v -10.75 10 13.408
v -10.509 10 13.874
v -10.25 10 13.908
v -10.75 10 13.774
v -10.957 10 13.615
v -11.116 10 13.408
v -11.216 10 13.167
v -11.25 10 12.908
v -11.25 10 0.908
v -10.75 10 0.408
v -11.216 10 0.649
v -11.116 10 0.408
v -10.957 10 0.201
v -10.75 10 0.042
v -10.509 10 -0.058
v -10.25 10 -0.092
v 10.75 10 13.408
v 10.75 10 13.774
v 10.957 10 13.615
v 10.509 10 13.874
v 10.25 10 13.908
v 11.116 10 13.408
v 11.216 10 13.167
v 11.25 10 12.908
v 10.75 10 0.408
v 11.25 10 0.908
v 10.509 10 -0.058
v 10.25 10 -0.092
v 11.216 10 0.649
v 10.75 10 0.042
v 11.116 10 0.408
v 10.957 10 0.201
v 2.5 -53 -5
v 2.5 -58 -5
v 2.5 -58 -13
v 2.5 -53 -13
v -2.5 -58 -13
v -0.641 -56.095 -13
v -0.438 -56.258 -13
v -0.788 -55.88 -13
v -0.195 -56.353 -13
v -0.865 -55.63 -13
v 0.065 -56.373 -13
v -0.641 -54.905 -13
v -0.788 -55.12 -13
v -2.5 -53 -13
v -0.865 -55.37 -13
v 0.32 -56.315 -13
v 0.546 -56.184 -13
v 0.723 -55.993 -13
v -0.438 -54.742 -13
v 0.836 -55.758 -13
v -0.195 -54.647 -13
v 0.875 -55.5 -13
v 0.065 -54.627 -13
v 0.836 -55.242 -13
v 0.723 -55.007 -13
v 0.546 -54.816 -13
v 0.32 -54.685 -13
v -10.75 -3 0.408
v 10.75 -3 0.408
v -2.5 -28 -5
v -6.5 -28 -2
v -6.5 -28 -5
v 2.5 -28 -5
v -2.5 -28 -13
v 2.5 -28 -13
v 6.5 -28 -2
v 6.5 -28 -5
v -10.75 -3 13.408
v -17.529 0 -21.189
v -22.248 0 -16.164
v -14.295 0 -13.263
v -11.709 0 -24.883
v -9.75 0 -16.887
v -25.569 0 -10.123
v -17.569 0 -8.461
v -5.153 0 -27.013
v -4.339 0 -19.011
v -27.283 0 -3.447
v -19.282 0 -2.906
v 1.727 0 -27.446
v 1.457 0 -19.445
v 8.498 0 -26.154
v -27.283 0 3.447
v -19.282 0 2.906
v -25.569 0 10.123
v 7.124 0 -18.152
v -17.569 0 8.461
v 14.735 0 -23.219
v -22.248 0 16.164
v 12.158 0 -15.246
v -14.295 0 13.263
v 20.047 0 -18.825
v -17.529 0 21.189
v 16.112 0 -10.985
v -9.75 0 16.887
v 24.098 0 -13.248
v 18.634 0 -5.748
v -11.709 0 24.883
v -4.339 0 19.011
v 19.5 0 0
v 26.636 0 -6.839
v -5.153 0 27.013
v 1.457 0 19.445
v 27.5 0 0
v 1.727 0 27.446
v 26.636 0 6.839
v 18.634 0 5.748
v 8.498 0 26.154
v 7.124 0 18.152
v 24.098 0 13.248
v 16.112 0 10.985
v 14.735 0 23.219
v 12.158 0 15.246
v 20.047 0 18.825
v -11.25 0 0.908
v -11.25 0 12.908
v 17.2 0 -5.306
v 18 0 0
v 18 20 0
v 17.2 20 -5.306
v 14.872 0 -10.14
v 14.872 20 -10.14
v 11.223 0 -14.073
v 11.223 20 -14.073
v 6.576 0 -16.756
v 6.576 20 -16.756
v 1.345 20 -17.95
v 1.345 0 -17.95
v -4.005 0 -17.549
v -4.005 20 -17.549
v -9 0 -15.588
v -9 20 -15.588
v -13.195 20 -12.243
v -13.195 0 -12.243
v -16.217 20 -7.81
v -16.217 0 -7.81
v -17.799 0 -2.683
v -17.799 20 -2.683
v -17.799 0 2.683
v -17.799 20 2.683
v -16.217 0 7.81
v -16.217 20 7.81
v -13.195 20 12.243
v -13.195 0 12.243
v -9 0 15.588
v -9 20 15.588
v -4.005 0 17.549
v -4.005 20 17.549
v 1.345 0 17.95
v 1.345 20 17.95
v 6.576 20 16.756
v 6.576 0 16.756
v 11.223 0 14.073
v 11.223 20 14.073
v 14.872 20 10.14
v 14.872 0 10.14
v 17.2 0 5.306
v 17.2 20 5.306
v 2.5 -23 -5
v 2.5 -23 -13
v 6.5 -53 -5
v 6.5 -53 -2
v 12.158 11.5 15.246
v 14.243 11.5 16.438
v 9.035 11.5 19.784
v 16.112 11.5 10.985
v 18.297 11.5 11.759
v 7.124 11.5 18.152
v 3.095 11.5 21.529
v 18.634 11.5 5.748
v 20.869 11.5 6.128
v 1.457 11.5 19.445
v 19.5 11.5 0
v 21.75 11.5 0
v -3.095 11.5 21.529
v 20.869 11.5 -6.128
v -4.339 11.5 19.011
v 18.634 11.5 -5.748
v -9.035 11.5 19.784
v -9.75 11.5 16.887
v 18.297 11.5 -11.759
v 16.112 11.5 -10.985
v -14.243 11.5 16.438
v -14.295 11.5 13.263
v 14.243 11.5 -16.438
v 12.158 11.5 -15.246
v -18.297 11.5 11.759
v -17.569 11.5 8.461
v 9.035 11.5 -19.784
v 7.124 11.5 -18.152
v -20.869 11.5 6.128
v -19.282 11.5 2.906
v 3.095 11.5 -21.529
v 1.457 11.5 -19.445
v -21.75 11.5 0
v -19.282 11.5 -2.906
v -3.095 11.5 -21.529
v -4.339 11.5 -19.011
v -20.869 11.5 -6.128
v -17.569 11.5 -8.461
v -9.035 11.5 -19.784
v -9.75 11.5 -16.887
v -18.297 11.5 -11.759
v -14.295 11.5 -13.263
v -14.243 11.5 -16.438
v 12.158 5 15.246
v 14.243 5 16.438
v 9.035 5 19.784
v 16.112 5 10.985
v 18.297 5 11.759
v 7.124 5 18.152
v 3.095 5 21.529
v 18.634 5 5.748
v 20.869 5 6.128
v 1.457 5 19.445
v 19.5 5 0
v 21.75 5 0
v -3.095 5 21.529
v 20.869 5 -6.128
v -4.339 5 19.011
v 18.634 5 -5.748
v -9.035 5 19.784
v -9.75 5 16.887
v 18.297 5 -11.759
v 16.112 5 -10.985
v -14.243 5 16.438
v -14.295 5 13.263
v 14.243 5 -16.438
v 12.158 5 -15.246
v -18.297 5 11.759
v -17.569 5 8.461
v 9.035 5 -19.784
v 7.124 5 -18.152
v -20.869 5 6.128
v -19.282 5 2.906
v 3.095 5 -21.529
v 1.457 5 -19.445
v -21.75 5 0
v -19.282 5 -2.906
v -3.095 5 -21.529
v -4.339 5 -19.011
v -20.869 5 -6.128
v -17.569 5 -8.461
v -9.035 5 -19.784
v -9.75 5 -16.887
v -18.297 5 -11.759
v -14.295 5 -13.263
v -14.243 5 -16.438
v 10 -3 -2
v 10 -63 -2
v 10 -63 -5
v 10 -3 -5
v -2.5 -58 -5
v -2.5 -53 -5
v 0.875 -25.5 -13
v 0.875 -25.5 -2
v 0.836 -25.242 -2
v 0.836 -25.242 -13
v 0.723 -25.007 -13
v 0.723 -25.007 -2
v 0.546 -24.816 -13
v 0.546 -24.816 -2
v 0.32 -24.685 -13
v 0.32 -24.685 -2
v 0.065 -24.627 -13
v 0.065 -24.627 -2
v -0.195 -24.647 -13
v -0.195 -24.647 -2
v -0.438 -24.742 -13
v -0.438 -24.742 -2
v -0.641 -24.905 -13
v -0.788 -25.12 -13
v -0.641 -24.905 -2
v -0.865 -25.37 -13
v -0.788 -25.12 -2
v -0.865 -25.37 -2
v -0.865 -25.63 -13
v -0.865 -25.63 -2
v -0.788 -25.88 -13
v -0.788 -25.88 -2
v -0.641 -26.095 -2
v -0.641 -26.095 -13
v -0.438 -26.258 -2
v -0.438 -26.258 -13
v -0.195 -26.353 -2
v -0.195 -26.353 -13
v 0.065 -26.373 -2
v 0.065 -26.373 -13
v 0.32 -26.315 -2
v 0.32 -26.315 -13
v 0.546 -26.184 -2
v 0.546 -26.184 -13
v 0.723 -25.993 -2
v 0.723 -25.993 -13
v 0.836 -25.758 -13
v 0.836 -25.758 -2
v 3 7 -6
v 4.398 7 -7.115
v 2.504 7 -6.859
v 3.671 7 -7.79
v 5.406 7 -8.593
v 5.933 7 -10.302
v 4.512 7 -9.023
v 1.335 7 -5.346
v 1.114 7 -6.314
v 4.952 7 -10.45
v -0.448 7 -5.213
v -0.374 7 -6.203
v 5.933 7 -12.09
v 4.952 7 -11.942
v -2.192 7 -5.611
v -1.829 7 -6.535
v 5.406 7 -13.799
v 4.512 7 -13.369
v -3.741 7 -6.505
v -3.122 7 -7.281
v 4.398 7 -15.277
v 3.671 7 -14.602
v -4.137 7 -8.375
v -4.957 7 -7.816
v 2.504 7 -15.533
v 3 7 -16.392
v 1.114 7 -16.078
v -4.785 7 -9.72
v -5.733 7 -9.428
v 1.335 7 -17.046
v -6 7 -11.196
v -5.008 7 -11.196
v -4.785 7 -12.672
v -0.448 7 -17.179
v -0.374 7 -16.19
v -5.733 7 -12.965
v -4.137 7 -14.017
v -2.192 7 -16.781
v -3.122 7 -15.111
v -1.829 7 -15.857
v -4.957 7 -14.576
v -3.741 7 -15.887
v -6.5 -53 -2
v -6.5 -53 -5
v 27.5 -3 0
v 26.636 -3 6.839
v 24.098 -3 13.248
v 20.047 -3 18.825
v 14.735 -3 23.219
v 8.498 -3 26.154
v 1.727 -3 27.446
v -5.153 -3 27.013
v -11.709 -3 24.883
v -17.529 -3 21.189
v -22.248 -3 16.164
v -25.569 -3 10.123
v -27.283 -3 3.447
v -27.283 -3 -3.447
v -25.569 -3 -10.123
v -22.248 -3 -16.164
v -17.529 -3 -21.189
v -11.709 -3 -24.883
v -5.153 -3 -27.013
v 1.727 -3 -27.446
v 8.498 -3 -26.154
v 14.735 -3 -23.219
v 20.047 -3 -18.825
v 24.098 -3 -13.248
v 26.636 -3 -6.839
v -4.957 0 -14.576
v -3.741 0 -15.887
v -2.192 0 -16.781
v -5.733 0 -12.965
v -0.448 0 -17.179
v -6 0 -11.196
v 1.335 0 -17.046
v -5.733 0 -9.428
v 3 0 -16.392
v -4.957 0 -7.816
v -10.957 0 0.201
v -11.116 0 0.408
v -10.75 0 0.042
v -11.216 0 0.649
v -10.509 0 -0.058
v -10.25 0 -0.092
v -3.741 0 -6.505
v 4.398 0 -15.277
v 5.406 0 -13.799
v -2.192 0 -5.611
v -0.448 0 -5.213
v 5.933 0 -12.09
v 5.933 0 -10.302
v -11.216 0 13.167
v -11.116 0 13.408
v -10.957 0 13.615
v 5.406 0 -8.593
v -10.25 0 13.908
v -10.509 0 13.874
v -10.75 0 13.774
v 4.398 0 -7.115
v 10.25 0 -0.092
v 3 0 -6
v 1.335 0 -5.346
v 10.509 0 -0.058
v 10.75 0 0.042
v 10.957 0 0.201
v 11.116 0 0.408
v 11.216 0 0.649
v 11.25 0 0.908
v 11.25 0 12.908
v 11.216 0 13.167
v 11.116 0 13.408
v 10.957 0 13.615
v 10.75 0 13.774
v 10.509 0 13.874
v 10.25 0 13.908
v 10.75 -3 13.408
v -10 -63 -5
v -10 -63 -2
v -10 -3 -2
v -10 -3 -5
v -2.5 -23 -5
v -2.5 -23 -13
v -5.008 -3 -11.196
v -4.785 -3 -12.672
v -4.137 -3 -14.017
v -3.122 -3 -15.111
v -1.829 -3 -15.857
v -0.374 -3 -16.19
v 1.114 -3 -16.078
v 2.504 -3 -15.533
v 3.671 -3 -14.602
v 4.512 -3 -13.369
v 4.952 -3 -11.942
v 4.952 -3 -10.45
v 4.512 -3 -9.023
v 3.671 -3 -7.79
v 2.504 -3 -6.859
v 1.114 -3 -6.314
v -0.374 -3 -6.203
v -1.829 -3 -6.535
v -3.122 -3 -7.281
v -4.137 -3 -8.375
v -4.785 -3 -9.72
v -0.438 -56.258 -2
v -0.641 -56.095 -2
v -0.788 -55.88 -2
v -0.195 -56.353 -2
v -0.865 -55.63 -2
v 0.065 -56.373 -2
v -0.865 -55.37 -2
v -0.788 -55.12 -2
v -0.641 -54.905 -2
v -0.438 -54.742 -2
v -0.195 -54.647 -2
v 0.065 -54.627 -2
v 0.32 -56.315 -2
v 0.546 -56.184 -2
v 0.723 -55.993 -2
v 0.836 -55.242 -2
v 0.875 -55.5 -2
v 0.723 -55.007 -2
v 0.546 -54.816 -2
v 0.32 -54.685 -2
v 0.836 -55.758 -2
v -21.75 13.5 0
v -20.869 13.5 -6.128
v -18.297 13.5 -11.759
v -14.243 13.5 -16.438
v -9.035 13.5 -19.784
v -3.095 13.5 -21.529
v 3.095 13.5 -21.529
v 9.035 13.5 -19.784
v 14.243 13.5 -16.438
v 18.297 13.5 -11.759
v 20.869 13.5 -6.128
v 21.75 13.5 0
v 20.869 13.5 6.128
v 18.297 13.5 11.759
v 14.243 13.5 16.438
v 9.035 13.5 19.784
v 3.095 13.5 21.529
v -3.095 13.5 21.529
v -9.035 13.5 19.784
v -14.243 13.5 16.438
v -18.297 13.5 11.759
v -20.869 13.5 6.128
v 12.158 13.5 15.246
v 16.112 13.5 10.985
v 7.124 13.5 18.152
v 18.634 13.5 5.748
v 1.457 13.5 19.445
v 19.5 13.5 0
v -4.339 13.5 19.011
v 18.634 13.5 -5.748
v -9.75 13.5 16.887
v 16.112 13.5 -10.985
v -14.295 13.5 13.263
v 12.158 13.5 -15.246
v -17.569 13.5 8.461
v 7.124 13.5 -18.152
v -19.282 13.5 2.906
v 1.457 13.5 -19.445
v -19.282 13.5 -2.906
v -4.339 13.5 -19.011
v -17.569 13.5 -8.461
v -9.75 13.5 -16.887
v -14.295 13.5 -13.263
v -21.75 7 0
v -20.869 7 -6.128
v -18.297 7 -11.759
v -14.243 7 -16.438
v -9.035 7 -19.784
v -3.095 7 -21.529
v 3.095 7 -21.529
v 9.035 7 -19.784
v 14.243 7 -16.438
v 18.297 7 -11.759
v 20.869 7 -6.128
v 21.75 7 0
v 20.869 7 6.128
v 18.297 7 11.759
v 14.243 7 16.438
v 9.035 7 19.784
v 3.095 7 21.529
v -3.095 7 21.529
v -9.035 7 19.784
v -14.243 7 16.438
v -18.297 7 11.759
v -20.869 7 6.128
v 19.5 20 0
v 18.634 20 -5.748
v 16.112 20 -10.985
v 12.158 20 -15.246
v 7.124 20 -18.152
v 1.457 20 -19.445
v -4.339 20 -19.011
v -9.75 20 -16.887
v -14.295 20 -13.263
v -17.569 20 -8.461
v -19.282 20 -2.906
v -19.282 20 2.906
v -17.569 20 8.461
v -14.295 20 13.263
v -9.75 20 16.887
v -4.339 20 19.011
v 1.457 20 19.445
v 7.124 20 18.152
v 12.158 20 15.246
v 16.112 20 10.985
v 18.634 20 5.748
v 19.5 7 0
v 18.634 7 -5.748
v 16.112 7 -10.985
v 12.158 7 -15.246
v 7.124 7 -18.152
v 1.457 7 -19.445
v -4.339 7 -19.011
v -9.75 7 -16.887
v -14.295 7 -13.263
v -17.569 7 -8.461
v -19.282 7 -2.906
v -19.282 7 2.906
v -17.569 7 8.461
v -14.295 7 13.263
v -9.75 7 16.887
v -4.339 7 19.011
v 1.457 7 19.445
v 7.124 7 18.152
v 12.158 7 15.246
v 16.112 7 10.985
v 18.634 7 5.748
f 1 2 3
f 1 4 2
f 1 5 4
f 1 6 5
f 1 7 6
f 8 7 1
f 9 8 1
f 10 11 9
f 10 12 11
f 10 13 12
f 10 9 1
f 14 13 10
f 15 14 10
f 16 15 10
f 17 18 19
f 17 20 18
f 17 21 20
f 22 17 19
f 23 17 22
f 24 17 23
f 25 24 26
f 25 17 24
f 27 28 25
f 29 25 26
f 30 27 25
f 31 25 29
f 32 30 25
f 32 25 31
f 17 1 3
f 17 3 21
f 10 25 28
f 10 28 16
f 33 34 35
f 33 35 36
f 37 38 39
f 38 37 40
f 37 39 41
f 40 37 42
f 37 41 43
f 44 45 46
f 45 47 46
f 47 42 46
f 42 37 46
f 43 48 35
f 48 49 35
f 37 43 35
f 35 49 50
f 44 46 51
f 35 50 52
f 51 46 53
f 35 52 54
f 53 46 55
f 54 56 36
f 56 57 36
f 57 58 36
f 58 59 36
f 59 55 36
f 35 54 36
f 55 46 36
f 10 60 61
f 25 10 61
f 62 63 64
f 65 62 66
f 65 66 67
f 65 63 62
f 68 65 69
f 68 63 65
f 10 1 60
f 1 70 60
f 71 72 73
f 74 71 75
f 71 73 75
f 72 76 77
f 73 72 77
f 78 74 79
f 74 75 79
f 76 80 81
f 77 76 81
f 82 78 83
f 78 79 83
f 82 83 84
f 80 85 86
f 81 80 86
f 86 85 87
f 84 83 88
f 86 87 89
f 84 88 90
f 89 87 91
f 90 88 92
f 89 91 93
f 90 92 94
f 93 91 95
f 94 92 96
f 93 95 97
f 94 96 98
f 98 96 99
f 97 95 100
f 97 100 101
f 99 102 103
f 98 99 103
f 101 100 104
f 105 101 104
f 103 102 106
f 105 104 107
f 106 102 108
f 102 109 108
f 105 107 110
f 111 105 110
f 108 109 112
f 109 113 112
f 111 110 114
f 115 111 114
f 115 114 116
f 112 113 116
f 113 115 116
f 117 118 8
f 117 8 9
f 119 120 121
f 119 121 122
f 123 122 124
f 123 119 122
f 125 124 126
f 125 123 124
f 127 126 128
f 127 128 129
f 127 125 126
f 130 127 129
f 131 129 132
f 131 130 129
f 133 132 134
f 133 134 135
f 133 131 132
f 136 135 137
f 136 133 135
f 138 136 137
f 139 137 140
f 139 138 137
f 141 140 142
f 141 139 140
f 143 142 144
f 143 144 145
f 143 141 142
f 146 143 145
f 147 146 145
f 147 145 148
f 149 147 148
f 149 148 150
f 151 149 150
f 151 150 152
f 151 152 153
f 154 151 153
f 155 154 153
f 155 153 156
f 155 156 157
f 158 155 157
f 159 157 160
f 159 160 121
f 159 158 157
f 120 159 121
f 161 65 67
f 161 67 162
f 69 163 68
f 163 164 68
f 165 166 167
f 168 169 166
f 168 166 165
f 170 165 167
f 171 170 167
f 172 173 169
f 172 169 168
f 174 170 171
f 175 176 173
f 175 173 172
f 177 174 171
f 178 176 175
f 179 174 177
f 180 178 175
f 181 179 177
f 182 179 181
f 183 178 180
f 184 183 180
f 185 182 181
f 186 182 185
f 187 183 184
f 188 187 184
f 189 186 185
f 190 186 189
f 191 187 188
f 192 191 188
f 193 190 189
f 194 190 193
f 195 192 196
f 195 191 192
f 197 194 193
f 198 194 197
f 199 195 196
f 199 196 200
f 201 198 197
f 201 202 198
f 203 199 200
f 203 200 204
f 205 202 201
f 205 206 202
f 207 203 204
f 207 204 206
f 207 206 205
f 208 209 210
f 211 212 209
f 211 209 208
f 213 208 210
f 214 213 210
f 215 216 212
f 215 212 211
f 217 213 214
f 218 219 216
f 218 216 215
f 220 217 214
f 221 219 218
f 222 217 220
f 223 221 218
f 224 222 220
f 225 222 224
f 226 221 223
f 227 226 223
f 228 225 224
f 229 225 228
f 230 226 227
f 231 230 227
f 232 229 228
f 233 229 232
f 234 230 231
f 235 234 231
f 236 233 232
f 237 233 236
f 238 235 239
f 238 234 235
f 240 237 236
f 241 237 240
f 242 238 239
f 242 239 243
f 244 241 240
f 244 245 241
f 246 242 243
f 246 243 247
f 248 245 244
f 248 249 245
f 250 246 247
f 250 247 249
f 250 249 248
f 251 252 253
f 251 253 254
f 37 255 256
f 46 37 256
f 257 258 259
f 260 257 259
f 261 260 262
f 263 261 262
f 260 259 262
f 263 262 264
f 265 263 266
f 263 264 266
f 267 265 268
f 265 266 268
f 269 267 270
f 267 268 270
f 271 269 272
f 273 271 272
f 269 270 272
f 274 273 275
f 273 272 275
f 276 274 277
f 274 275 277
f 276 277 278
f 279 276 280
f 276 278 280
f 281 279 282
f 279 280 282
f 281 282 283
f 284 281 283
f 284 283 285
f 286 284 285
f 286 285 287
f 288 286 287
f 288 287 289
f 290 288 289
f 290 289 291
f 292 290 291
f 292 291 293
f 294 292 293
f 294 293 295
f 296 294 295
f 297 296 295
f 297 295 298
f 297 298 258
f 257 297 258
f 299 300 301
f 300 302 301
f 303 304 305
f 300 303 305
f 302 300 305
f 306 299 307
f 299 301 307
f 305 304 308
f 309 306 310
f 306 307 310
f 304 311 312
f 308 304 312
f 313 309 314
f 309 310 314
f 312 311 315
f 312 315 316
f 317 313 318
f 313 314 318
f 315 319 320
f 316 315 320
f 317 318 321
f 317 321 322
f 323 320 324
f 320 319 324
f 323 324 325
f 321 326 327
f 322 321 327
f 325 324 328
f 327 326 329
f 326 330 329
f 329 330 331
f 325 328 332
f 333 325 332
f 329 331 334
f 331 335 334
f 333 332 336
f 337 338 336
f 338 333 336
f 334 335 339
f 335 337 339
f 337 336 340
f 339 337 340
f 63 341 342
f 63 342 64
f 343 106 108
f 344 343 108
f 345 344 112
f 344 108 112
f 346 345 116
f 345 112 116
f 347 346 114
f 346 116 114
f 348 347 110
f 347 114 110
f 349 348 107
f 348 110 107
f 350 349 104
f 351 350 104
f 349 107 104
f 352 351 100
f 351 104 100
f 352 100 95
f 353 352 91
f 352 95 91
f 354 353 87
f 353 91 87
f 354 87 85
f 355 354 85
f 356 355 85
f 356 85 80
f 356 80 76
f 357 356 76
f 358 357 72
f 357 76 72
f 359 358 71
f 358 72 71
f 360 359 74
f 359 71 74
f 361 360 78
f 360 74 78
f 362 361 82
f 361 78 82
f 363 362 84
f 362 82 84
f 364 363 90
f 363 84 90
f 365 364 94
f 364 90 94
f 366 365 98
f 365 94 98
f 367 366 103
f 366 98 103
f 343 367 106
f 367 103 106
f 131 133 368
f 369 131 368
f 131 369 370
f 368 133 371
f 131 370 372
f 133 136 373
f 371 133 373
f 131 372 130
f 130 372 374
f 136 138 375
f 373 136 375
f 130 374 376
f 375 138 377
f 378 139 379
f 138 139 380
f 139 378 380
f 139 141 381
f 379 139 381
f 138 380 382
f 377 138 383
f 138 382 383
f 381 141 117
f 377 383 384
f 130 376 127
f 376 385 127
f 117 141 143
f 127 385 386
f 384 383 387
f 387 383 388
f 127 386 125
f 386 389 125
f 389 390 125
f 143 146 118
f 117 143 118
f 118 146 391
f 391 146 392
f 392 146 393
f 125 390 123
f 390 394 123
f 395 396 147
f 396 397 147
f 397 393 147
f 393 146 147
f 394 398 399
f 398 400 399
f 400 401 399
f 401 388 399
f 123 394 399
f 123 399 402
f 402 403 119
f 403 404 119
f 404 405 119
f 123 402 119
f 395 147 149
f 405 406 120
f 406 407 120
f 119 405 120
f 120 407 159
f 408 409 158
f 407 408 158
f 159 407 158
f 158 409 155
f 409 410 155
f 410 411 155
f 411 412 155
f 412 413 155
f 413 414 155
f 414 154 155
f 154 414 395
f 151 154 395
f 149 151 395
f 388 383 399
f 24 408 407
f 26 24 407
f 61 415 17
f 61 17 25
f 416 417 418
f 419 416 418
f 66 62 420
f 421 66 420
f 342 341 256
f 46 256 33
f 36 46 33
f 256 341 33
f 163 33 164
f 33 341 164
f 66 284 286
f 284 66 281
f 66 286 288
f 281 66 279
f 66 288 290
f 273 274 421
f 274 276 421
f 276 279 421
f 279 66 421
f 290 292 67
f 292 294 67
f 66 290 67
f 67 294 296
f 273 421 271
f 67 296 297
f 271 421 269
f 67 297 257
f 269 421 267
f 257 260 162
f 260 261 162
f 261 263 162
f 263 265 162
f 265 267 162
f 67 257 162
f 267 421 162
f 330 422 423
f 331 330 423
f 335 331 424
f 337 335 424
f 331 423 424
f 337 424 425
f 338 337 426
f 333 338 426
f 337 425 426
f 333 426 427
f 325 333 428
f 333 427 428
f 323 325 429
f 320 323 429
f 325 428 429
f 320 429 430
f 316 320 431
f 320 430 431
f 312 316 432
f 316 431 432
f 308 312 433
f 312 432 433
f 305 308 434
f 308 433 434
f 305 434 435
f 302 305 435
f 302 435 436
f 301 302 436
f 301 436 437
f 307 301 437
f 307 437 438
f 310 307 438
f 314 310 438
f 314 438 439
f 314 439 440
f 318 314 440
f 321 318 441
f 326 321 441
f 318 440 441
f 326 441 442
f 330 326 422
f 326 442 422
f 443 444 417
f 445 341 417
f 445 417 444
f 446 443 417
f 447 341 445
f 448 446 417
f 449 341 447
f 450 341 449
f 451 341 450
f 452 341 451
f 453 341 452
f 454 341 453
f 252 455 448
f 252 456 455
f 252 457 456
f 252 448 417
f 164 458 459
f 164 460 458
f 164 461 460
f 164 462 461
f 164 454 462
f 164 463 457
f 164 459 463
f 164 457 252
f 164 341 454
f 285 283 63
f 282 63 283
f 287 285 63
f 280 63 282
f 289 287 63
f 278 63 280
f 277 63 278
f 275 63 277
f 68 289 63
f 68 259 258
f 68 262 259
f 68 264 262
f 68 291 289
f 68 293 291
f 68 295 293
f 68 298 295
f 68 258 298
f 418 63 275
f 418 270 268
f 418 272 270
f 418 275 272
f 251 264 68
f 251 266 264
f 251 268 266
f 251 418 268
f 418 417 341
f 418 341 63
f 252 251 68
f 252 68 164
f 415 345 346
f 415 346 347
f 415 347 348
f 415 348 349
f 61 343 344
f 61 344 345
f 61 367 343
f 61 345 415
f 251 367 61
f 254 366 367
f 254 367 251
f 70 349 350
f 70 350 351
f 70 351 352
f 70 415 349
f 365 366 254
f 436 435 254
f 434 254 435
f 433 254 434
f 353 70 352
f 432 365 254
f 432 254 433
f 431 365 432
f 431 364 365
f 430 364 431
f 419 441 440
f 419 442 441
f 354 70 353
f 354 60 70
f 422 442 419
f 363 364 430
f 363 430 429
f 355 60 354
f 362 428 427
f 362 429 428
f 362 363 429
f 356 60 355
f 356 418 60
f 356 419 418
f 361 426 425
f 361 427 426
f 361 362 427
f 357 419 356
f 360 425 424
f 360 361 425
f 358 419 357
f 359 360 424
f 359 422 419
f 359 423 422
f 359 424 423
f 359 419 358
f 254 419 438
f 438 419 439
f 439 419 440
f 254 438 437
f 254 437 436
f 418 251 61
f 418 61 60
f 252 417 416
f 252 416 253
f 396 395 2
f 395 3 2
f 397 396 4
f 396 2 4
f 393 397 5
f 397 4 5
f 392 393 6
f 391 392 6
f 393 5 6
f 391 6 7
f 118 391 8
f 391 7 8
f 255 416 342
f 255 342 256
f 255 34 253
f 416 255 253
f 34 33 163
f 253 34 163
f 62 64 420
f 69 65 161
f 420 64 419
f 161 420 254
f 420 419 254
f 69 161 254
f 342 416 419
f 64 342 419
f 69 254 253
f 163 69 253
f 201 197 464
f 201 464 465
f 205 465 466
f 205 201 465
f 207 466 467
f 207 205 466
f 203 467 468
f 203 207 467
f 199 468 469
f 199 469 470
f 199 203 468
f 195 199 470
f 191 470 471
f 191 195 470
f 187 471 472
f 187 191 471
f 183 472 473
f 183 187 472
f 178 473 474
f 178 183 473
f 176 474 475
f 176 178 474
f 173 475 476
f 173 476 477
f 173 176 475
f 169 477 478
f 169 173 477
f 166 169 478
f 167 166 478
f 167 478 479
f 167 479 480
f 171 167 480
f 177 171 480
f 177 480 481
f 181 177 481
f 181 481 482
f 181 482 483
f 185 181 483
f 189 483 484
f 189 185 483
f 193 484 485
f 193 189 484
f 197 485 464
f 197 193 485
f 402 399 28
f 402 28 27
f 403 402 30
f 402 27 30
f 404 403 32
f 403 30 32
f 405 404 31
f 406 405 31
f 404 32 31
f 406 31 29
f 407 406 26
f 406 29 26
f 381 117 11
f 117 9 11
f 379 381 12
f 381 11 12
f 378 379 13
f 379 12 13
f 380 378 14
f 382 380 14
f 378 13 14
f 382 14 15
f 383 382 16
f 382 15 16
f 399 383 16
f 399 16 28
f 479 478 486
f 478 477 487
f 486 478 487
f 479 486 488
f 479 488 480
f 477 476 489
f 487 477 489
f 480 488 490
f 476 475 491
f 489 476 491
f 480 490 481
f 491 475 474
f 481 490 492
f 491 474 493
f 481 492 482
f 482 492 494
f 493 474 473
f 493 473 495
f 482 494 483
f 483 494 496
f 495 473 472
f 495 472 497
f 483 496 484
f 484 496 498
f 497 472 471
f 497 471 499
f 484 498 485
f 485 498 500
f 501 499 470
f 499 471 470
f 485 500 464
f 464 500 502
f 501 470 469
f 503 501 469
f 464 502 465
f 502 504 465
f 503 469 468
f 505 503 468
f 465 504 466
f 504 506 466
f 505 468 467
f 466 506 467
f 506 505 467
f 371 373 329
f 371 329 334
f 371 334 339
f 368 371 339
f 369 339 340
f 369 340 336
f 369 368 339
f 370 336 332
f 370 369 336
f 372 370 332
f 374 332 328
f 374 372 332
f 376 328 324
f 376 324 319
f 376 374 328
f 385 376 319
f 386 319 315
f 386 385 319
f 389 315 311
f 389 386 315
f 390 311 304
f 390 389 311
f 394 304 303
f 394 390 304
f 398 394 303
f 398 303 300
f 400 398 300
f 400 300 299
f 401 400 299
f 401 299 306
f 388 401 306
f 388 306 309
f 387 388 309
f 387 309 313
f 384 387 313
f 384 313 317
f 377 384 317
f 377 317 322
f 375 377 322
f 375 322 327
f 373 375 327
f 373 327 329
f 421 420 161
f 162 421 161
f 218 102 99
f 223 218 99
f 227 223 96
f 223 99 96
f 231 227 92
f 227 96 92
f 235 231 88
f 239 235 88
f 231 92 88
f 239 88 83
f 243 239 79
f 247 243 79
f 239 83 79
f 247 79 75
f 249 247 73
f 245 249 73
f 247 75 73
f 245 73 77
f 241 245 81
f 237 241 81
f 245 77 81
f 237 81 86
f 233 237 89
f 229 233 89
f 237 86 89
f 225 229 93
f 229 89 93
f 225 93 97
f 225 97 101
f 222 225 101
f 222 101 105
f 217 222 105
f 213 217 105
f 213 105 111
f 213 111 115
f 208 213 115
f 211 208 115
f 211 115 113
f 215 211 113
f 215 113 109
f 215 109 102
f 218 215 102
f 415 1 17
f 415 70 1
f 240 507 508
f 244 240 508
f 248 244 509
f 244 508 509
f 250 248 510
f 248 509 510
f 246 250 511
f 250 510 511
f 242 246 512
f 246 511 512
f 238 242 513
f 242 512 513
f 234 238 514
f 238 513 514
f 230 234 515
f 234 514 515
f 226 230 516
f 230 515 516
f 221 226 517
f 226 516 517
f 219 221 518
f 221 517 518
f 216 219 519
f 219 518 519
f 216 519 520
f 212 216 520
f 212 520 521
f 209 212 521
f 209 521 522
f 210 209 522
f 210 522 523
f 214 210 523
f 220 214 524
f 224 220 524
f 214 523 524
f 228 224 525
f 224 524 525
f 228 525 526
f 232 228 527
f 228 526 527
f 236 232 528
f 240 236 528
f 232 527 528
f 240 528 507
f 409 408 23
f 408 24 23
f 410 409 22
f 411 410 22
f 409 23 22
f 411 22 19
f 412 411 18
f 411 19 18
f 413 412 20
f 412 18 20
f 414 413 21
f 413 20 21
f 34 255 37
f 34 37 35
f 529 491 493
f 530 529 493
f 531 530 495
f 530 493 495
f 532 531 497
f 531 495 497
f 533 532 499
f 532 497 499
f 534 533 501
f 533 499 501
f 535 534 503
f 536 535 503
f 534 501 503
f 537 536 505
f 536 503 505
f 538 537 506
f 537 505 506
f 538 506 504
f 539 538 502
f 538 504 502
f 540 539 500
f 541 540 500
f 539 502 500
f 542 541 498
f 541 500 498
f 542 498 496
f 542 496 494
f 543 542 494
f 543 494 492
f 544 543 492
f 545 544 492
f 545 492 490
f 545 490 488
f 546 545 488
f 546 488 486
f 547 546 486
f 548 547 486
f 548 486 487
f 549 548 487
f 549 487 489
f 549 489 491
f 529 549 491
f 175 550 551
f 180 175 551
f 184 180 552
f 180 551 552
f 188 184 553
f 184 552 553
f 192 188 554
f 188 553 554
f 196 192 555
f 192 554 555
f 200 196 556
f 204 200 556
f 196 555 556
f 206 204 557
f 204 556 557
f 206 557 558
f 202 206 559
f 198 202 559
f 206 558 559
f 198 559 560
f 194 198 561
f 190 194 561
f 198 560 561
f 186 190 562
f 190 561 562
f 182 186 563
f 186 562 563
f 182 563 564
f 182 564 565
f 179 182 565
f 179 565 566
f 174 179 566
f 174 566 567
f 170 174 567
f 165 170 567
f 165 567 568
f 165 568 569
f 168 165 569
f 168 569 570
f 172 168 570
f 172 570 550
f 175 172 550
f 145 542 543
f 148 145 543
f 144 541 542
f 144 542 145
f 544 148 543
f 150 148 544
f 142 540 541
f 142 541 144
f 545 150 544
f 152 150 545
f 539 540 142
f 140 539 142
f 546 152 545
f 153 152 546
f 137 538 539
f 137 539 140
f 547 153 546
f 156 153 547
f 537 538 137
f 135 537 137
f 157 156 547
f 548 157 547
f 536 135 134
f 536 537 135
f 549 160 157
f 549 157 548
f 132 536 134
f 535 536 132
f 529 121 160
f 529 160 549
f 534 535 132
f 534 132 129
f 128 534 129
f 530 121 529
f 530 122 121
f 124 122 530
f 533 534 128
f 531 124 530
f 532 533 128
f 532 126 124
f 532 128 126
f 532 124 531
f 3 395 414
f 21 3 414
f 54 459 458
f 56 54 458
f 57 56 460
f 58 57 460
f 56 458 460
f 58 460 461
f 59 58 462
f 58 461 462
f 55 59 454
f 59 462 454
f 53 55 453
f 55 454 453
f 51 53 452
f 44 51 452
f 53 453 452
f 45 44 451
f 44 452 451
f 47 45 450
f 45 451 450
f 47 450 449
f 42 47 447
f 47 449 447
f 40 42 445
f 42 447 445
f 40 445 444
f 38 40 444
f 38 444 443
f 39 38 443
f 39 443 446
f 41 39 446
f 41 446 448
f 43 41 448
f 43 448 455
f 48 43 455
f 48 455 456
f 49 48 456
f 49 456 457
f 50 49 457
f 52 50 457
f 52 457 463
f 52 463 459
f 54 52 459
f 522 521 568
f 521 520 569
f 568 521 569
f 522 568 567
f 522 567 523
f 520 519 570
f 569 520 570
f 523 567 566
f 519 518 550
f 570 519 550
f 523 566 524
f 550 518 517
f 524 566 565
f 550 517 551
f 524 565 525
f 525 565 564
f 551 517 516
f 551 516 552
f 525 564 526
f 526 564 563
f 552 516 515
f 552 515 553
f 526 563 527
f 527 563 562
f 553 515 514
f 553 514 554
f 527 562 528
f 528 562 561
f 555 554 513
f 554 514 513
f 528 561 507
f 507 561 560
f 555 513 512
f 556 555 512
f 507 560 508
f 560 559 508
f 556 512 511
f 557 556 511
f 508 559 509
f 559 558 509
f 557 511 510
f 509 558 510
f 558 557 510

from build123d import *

# Parameters (mm, degrees)
SKETCH_1_R               = 19.5
SKETCH_1_R_2             = 18
EXTRUDE_1_DEPTH          = 20
SKETCH_3_R               = 27.5
EXTRUDE_2_DEPTH          = 3
SKETCH_10_R              = 6
SKETCH_10_R_2            = 5
EXTRUDE_6_DEPTH          = 10
SKETCH_11_R              = 5.007506695
CUT_EXTRUDE_4_DEPTH      = 19
CUT_EXTRUDE_4_DEPTH_BACK = 10
SKETCH_15_W              = 20
SKETCH_15_H              = 60
SKETCH_15_W_2            = 13
SKETCH_15_H_2            = 25
EXTRUDE_7_DEPTH          = 1
EXTRUDE_7_DEPTH_BACK     = 2
SKETCH_16_W              = 5
SKETCH_16_H              = 5
EXTRUDE_8_DEPTH          = 10
SKETCH_18_R              = 0.875
CUT_EXTRUDE_5_DEPTH      = 10
CUT_EXTRUDE_5_DEPTH_BACK = 39
SKETCH_12_W              = 21.5
SKETCH_12_H              = 13
CUT_EXTRUDE_6_DEPTH      = 21.5
SKETCH_19_W              = 22.5
SKETCH_19_H              = 14
SKETCH_19_W_2            = 21.5
SKETCH_19_H_2            = 13
EXTRUDE_9_DEPTH          = 10
FILLET_2_R               = 1
FILLET_3_R               = 1
FILLET_4_R               = 1
FILLET_5_R               = 1
SKETCH_25_R              = 21.75
SKETCH_25_R_2            = 19.5
EXTRUDE_12_DEPTH         = 2
EXTRUDE_START            = -1
SKETCH_26_R              = 21.75
SKETCH_26_R_2            = 19.5
EXTRUDE_13_DEPTH         = 2


with BuildPart() as part:
    # 草圖1 → 填料-伸長1 (new body)
    with BuildSketch(Plane(origin=(0, 0, 0), x_dir=(1, 0, 0), z_dir=(0, 1, 0))):
        Circle(SKETCH_1_R)
        Circle(SKETCH_1_R_2, mode=Mode.SUBTRACT)
    extrude(amount=EXTRUDE_1_DEPTH)

    # 草圖3 → 填料-伸長2 (add)
    with BuildSketch(Plane.XZ):
        Circle(SKETCH_3_R)
    extrude(amount=EXTRUDE_2_DEPTH)

    # 草圖10 → 填料-伸長6 (add)
    with BuildSketch(Plane(origin=(0, -3, 0), x_dir=(-1, 0, 0), z_dir=(0, -1, 0))):
        with Locations((0, 11.196036894)):
            Circle(SKETCH_10_R)
        with Locations((0, 11.196036894)):
            Circle(SKETCH_10_R_2, mode=Mode.SUBTRACT)
    extrude(amount=-EXTRUDE_6_DEPTH)

    # 草圖11 → 除料-伸長4 (cut, two sides)
    with BuildSketch(Plane(origin=(0, -3, 0), x_dir=(-1, 0, 0), z_dir=(0, -1, 0))) as cut_extrude_4_sk:
        with Locations((0, 11.196036894)):
            Circle(SKETCH_11_R)
    extrude(amount=CUT_EXTRUDE_4_DEPTH, mode=Mode.SUBTRACT)
    extrude(cut_extrude_4_sk.sketch, amount=-CUT_EXTRUDE_4_DEPTH_BACK, mode=Mode.SUBTRACT)

    # 草圖15 → 填料-伸長7 (add, two sides)
    with BuildSketch(Plane.XY.offset(-3)) as extrude_7_sk:
        with Locations((0, -33)):
            Rectangle(SKETCH_15_W, SKETCH_15_H)
        with Locations((0, -40.5)):
            Rectangle(SKETCH_15_W_2, SKETCH_15_H_2, mode=Mode.SUBTRACT)
    extrude(amount=EXTRUDE_7_DEPTH)
    extrude(extrude_7_sk.sketch, amount=-EXTRUDE_7_DEPTH_BACK)

    # 草圖16 → 填料-伸長8 (add)
    with BuildSketch(Plane.XY.offset(-3)):
        with Locations((0, -25.5)):
            Rectangle(SKETCH_16_W, SKETCH_16_H)
        with Locations((0, -55.5)):
            Rectangle(SKETCH_16_W, SKETCH_16_H)
    extrude(amount=-EXTRUDE_8_DEPTH)

    # 草圖18 → 除料-伸長5 (cut, two sides)
    with BuildSketch(Plane.XY) as cut_extrude_5_sk:
        with Locations((0, -55.5)):
            Circle(SKETCH_18_R)
        with Locations((0, -25.5)):
            Circle(SKETCH_18_R)
    extrude(amount=CUT_EXTRUDE_5_DEPTH, mode=Mode.SUBTRACT)
    extrude(cut_extrude_5_sk.sketch, amount=-CUT_EXTRUDE_5_DEPTH_BACK, mode=Mode.SUBTRACT)

    # 草圖12 → 除料-伸長6 (cut)
    with BuildSketch(Plane.XZ.offset(3)):
        with Locations((0, 6.907998134)):
            Rectangle(SKETCH_12_W, SKETCH_12_H)
    extrude(amount=-CUT_EXTRUDE_6_DEPTH, mode=Mode.SUBTRACT)

    # 草圖19 → 填料-伸長9 (add)
    with BuildSketch(Plane(origin=(0, 0, 0), x_dir=(1, 0, 0), z_dir=(0, 1, 0))):
        with Locations((0, -6.907998134)):
            Rectangle(SKETCH_19_W, SKETCH_19_H)
        with Locations((0, -6.907998134)):
            Rectangle(SKETCH_19_W_2, SKETCH_19_H_2, mode=Mode.SUBTRACT)
    extrude(amount=EXTRUDE_9_DEPTH)

    # 圓角2
    fillet_2_edges = [part.edges().sort_by_distance(p)[0] for p in [
        (-11.25, 5, -0.092001866),
    ]]
    fillet(fillet_2_edges, radius=FILLET_2_R)

    # 圓角3
    fillet_3_edges = [part.edges().sort_by_distance(p)[0] for p in [
        (11.25, 5, -0.092001866),
    ]]
    fillet(fillet_3_edges, radius=FILLET_3_R)

    # 圓角4
    fillet_4_edges = [part.edges().sort_by_distance(p)[0] for p in [
        (11.25, 5, 13.907998134),
    ]]
    fillet(fillet_4_edges, radius=FILLET_4_R)

    # 圓角5
    fillet_5_edges = [part.edges().sort_by_distance(p)[0] for p in [
        (-11.25, 5, 13.907998134),
    ]]
    fillet(fillet_5_edges, radius=FILLET_5_R)

    # 草圖25 → 填料-伸長12 (add)
    with BuildSketch(Plane(origin=(0, 7, 0), x_dir=(-1, 0, 0), z_dir=(0, -1, 0))):
        Circle(SKETCH_25_R)
        Circle(SKETCH_25_R_2, mode=Mode.SUBTRACT)
    extrude(amount=EXTRUDE_12_DEPTH)

    # 草圖26 → 填料-伸長13 (add)
    with BuildSketch(Plane(origin=(0, 10.5, 0), x_dir=(-1, 0, 0), z_dir=(0, -1, 0)).offset(EXTRUDE_START)):
        Circle(SKETCH_26_R)
        Circle(SKETCH_26_R_2, mode=Mode.SUBTRACT)
    extrude(amount=-EXTRUDE_13_DEPTH)


solid = part.part
